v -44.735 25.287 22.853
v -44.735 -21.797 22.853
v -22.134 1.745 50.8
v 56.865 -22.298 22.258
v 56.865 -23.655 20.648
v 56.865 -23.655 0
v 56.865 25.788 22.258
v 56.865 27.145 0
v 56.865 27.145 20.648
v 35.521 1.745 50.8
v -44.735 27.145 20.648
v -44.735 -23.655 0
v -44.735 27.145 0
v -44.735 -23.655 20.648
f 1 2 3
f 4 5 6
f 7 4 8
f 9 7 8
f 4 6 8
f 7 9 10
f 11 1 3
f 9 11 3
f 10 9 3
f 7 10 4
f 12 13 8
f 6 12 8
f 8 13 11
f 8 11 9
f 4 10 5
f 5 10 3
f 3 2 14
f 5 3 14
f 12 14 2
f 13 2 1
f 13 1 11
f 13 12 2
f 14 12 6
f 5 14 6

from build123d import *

# Parameters (mm, degrees)
F0_W     = 101.6
F0_H     = 50.8
F1_DEPTH = 50.8
F3_DEPTH = 115.824
F5_DEPTH = 33.528
F6_DEPTH = 41.402


with BuildPart() as f1:
    # F0 (on Top) → F1 (new body)
    with BuildSketch(Plane.XY):
        with Locations((6.0652717948, 1.7450194966)):
            Rectangle(F0_W, F0_H)
    extrude(amount=F1_DEPTH)

    # F2 (on face) → F3 (cut)
    with BuildSketch(Plane(origin=(-44.7347282052, 0, 0), x_dir=(0, -1, 0), z_dir=(-1, 0, 0))):
        Polygon((-27.1450194966, 20.6477418542), (-1.7450194966, 50.8), (-27.1450194966, 50.8), align=None)
        Polygon((23.6549805034, 50.8), (-1.7450194966, 50.8), (23.6549805034, 20.6477418542), align=None)
    extrude(amount=-F3_DEPTH, mode=Mode.SUBTRACT)

    # F4 (on Front) → F5 (cut)
    with BuildSketch(Plane.XZ):
        Polygon((-21.6801278293, 51.361259073), (-44.908836484, 51.361259073), (-45.6831306219, 21.680129692), align=None)
        Polygon((57.2974830866, 51.361259073), (35.1011604071, 51.361259073), (57.2974830866, 21.680129692), align=None)
    extrude(amount=-F5_DEPTH, mode=Mode.SUBTRACT)

    # F6 (cut): faces of the model
    f6_faces = [f1.faces().sort_by_distance(p)[0] for p in [
        (50.2668517161, 0, 39.9050242048),
        (-37.7595636519, 0, 40.1032904014),
    ]]
    extrude(f6_faces, amount=-F6_DEPTH, mode=Mode.SUBTRACT)


solid = f1.part
